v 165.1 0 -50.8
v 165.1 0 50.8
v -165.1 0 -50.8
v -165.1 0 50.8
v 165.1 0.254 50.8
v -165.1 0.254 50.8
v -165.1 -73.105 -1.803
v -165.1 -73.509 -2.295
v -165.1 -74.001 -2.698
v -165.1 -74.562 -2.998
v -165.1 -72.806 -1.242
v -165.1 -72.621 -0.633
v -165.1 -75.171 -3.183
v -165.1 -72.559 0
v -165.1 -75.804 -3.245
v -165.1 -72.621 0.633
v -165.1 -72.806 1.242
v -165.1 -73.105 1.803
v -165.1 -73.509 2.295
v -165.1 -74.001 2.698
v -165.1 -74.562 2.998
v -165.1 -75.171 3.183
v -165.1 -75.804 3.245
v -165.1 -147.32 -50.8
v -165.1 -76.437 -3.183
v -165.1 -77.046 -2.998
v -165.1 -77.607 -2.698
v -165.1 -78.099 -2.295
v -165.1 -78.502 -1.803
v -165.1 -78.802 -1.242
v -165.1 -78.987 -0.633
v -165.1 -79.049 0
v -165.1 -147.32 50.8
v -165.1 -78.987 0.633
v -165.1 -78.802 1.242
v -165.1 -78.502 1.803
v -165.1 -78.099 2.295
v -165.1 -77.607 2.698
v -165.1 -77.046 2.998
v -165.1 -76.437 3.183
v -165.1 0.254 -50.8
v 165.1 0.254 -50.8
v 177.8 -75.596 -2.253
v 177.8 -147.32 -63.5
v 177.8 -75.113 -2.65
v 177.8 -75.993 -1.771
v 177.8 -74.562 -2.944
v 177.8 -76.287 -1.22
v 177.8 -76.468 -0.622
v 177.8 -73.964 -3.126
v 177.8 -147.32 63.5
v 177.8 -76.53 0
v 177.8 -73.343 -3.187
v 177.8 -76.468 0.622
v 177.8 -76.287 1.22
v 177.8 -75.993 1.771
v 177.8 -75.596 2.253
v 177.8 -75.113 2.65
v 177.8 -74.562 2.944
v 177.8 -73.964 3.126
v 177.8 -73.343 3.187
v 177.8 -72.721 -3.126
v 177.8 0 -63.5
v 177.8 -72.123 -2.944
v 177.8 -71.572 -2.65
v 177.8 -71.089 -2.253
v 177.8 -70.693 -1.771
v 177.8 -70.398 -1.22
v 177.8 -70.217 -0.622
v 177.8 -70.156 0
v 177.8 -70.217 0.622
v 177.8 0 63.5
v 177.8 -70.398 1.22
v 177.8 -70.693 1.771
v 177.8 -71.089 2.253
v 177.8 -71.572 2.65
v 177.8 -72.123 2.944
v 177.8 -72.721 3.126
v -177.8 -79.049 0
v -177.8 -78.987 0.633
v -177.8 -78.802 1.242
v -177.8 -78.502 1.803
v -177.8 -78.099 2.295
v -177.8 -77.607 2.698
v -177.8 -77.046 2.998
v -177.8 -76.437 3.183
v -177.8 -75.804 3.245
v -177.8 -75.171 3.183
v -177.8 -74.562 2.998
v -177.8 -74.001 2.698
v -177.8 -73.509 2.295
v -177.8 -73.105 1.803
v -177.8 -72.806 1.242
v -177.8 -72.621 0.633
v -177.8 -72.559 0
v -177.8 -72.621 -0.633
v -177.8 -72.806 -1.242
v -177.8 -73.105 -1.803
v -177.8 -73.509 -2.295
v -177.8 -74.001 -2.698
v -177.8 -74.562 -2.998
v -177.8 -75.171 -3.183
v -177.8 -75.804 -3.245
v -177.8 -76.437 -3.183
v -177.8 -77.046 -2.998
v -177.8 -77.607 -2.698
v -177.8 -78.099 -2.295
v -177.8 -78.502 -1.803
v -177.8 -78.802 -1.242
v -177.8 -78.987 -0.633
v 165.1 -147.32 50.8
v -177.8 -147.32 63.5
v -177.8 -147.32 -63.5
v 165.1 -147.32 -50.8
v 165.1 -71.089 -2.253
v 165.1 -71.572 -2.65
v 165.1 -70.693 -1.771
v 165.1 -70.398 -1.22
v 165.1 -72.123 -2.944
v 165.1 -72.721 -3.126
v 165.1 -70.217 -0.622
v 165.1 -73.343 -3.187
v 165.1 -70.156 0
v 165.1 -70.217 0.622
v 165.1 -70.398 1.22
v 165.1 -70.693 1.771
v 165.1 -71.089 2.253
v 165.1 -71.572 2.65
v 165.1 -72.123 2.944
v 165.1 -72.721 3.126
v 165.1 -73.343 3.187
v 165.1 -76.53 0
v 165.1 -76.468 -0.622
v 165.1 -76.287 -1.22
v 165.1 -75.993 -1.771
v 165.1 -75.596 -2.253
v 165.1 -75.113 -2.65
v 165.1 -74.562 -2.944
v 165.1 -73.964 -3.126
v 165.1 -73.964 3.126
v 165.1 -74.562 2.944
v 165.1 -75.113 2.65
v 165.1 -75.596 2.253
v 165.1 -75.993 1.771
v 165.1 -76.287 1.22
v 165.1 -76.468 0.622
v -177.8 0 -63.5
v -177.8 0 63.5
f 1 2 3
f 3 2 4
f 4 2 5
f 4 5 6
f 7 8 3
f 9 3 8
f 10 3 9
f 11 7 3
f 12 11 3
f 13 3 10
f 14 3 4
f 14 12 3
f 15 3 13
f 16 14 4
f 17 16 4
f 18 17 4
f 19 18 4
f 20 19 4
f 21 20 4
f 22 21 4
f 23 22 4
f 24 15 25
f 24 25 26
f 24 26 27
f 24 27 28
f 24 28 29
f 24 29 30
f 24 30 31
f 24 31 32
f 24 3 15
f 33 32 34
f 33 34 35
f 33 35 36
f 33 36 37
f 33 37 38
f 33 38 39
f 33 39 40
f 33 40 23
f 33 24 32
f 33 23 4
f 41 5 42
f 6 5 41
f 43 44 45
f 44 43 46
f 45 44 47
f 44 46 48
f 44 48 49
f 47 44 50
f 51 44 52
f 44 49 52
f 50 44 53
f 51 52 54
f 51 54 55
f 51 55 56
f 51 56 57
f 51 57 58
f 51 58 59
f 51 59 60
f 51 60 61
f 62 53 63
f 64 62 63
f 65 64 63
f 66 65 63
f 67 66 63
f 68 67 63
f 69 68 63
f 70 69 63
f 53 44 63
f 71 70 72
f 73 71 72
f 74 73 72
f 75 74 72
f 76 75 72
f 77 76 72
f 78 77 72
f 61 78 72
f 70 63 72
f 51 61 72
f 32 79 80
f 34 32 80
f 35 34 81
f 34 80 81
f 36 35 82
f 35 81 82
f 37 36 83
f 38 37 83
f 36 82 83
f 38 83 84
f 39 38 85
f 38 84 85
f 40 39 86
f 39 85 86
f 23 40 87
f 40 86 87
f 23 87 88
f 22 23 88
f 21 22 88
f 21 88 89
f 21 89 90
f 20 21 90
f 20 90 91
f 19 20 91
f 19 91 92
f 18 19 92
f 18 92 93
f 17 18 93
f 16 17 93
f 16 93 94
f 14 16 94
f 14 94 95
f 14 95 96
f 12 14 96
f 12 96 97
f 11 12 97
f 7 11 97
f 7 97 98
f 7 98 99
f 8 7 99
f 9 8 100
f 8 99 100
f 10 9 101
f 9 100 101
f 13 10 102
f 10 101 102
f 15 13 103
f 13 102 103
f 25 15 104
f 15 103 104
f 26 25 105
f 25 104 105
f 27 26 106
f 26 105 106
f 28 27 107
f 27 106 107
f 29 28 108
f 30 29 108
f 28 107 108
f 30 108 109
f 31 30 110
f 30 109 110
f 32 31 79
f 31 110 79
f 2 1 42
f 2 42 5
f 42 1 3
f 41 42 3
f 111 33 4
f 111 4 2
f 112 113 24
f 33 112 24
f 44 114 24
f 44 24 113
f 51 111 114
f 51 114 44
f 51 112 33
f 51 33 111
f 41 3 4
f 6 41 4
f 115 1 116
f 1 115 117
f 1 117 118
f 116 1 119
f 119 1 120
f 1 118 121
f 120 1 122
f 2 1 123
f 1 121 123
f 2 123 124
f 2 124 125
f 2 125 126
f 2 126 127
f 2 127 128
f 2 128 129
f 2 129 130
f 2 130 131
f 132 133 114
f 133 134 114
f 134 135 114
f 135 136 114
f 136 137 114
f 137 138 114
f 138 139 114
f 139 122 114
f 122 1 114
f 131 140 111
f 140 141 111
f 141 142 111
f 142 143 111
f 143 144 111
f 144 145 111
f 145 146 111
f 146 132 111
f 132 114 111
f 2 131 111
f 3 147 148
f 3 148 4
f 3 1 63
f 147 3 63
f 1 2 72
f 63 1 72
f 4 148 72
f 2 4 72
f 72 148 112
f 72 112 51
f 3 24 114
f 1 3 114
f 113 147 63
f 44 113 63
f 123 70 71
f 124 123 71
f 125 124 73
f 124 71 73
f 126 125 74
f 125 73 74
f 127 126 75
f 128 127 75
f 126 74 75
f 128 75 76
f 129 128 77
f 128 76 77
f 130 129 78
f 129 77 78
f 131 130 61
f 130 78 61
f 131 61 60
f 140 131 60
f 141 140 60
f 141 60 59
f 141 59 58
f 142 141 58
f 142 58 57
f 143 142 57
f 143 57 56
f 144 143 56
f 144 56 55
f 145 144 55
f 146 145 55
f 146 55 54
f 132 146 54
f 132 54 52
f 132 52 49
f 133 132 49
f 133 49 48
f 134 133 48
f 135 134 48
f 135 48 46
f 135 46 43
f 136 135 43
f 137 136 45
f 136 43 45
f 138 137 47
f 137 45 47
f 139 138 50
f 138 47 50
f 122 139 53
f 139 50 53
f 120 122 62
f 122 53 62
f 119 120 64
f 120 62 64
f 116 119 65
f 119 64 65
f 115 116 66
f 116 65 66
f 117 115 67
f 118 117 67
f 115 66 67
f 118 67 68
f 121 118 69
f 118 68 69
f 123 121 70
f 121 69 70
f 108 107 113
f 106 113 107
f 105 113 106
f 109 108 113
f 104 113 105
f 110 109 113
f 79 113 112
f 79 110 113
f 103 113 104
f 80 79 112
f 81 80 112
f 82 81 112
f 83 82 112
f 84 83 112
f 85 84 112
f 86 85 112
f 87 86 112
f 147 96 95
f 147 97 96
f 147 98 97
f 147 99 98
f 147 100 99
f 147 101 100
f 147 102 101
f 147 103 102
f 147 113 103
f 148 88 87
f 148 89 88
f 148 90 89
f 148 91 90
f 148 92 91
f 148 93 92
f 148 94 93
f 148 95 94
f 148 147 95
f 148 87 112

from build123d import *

# Parameters (mm, degrees)
F0_W     = 355.6
F0_H     = 127
F1_DEPTH = 147.32
F2_W     = 330.2
F2_H     = 101.6
F3_DEPTH = 147.32
F4_W     = 330.2
F4_H     = 101.6
F5_DEPTH = 0.254
F6_R     = 3.245311
F7_DEPTH = 25.4
F8_R     = 3.186869
F9_DEPTH = 25.4


with BuildPart() as f1:
    # F0 (on Front) → F1 (new body)
    with BuildSketch(Plane.XZ):
        Rectangle(F0_W, F0_H)
    extrude(amount=F1_DEPTH)

    # F2 (on face) → F3 (cut, through all)
    with BuildSketch(Plane.XZ.offset(147.32)):
        Rectangle(F2_W, F2_H)
    extrude(amount=-F3_DEPTH, mode=Mode.SUBTRACT)

    # F6 (on face) → F7 (cut)
    with BuildSketch(Plane(origin=(-177.8, 0, 0), x_dir=(0, -1, 0), z_dir=(-1, 0, 0))):
        with Locations((75.803846, 0)):
            Circle(F6_R)
    extrude(amount=-F7_DEPTH, mode=Mode.SUBTRACT)

    # F8 (on face) → F9 (cut)
    with BuildSketch(Plane.YZ.offset(177.8)):
        with Locations((-73.342763, 0)):
            Circle(F8_R)
    extrude(amount=-F9_DEPTH, mode=Mode.SUBTRACT)


with BuildPart() as f5:
    # F4 (on face) → F5 (new body)
    with BuildSketch(Plane(origin=(0, 0, 0), x_dir=(-1, 0, 0), z_dir=(0, 1, 0))):
        Rectangle(F4_W, F4_H)
    extrude(amount=F5_DEPTH)


solid = Compound([f1.part, f5.part])
